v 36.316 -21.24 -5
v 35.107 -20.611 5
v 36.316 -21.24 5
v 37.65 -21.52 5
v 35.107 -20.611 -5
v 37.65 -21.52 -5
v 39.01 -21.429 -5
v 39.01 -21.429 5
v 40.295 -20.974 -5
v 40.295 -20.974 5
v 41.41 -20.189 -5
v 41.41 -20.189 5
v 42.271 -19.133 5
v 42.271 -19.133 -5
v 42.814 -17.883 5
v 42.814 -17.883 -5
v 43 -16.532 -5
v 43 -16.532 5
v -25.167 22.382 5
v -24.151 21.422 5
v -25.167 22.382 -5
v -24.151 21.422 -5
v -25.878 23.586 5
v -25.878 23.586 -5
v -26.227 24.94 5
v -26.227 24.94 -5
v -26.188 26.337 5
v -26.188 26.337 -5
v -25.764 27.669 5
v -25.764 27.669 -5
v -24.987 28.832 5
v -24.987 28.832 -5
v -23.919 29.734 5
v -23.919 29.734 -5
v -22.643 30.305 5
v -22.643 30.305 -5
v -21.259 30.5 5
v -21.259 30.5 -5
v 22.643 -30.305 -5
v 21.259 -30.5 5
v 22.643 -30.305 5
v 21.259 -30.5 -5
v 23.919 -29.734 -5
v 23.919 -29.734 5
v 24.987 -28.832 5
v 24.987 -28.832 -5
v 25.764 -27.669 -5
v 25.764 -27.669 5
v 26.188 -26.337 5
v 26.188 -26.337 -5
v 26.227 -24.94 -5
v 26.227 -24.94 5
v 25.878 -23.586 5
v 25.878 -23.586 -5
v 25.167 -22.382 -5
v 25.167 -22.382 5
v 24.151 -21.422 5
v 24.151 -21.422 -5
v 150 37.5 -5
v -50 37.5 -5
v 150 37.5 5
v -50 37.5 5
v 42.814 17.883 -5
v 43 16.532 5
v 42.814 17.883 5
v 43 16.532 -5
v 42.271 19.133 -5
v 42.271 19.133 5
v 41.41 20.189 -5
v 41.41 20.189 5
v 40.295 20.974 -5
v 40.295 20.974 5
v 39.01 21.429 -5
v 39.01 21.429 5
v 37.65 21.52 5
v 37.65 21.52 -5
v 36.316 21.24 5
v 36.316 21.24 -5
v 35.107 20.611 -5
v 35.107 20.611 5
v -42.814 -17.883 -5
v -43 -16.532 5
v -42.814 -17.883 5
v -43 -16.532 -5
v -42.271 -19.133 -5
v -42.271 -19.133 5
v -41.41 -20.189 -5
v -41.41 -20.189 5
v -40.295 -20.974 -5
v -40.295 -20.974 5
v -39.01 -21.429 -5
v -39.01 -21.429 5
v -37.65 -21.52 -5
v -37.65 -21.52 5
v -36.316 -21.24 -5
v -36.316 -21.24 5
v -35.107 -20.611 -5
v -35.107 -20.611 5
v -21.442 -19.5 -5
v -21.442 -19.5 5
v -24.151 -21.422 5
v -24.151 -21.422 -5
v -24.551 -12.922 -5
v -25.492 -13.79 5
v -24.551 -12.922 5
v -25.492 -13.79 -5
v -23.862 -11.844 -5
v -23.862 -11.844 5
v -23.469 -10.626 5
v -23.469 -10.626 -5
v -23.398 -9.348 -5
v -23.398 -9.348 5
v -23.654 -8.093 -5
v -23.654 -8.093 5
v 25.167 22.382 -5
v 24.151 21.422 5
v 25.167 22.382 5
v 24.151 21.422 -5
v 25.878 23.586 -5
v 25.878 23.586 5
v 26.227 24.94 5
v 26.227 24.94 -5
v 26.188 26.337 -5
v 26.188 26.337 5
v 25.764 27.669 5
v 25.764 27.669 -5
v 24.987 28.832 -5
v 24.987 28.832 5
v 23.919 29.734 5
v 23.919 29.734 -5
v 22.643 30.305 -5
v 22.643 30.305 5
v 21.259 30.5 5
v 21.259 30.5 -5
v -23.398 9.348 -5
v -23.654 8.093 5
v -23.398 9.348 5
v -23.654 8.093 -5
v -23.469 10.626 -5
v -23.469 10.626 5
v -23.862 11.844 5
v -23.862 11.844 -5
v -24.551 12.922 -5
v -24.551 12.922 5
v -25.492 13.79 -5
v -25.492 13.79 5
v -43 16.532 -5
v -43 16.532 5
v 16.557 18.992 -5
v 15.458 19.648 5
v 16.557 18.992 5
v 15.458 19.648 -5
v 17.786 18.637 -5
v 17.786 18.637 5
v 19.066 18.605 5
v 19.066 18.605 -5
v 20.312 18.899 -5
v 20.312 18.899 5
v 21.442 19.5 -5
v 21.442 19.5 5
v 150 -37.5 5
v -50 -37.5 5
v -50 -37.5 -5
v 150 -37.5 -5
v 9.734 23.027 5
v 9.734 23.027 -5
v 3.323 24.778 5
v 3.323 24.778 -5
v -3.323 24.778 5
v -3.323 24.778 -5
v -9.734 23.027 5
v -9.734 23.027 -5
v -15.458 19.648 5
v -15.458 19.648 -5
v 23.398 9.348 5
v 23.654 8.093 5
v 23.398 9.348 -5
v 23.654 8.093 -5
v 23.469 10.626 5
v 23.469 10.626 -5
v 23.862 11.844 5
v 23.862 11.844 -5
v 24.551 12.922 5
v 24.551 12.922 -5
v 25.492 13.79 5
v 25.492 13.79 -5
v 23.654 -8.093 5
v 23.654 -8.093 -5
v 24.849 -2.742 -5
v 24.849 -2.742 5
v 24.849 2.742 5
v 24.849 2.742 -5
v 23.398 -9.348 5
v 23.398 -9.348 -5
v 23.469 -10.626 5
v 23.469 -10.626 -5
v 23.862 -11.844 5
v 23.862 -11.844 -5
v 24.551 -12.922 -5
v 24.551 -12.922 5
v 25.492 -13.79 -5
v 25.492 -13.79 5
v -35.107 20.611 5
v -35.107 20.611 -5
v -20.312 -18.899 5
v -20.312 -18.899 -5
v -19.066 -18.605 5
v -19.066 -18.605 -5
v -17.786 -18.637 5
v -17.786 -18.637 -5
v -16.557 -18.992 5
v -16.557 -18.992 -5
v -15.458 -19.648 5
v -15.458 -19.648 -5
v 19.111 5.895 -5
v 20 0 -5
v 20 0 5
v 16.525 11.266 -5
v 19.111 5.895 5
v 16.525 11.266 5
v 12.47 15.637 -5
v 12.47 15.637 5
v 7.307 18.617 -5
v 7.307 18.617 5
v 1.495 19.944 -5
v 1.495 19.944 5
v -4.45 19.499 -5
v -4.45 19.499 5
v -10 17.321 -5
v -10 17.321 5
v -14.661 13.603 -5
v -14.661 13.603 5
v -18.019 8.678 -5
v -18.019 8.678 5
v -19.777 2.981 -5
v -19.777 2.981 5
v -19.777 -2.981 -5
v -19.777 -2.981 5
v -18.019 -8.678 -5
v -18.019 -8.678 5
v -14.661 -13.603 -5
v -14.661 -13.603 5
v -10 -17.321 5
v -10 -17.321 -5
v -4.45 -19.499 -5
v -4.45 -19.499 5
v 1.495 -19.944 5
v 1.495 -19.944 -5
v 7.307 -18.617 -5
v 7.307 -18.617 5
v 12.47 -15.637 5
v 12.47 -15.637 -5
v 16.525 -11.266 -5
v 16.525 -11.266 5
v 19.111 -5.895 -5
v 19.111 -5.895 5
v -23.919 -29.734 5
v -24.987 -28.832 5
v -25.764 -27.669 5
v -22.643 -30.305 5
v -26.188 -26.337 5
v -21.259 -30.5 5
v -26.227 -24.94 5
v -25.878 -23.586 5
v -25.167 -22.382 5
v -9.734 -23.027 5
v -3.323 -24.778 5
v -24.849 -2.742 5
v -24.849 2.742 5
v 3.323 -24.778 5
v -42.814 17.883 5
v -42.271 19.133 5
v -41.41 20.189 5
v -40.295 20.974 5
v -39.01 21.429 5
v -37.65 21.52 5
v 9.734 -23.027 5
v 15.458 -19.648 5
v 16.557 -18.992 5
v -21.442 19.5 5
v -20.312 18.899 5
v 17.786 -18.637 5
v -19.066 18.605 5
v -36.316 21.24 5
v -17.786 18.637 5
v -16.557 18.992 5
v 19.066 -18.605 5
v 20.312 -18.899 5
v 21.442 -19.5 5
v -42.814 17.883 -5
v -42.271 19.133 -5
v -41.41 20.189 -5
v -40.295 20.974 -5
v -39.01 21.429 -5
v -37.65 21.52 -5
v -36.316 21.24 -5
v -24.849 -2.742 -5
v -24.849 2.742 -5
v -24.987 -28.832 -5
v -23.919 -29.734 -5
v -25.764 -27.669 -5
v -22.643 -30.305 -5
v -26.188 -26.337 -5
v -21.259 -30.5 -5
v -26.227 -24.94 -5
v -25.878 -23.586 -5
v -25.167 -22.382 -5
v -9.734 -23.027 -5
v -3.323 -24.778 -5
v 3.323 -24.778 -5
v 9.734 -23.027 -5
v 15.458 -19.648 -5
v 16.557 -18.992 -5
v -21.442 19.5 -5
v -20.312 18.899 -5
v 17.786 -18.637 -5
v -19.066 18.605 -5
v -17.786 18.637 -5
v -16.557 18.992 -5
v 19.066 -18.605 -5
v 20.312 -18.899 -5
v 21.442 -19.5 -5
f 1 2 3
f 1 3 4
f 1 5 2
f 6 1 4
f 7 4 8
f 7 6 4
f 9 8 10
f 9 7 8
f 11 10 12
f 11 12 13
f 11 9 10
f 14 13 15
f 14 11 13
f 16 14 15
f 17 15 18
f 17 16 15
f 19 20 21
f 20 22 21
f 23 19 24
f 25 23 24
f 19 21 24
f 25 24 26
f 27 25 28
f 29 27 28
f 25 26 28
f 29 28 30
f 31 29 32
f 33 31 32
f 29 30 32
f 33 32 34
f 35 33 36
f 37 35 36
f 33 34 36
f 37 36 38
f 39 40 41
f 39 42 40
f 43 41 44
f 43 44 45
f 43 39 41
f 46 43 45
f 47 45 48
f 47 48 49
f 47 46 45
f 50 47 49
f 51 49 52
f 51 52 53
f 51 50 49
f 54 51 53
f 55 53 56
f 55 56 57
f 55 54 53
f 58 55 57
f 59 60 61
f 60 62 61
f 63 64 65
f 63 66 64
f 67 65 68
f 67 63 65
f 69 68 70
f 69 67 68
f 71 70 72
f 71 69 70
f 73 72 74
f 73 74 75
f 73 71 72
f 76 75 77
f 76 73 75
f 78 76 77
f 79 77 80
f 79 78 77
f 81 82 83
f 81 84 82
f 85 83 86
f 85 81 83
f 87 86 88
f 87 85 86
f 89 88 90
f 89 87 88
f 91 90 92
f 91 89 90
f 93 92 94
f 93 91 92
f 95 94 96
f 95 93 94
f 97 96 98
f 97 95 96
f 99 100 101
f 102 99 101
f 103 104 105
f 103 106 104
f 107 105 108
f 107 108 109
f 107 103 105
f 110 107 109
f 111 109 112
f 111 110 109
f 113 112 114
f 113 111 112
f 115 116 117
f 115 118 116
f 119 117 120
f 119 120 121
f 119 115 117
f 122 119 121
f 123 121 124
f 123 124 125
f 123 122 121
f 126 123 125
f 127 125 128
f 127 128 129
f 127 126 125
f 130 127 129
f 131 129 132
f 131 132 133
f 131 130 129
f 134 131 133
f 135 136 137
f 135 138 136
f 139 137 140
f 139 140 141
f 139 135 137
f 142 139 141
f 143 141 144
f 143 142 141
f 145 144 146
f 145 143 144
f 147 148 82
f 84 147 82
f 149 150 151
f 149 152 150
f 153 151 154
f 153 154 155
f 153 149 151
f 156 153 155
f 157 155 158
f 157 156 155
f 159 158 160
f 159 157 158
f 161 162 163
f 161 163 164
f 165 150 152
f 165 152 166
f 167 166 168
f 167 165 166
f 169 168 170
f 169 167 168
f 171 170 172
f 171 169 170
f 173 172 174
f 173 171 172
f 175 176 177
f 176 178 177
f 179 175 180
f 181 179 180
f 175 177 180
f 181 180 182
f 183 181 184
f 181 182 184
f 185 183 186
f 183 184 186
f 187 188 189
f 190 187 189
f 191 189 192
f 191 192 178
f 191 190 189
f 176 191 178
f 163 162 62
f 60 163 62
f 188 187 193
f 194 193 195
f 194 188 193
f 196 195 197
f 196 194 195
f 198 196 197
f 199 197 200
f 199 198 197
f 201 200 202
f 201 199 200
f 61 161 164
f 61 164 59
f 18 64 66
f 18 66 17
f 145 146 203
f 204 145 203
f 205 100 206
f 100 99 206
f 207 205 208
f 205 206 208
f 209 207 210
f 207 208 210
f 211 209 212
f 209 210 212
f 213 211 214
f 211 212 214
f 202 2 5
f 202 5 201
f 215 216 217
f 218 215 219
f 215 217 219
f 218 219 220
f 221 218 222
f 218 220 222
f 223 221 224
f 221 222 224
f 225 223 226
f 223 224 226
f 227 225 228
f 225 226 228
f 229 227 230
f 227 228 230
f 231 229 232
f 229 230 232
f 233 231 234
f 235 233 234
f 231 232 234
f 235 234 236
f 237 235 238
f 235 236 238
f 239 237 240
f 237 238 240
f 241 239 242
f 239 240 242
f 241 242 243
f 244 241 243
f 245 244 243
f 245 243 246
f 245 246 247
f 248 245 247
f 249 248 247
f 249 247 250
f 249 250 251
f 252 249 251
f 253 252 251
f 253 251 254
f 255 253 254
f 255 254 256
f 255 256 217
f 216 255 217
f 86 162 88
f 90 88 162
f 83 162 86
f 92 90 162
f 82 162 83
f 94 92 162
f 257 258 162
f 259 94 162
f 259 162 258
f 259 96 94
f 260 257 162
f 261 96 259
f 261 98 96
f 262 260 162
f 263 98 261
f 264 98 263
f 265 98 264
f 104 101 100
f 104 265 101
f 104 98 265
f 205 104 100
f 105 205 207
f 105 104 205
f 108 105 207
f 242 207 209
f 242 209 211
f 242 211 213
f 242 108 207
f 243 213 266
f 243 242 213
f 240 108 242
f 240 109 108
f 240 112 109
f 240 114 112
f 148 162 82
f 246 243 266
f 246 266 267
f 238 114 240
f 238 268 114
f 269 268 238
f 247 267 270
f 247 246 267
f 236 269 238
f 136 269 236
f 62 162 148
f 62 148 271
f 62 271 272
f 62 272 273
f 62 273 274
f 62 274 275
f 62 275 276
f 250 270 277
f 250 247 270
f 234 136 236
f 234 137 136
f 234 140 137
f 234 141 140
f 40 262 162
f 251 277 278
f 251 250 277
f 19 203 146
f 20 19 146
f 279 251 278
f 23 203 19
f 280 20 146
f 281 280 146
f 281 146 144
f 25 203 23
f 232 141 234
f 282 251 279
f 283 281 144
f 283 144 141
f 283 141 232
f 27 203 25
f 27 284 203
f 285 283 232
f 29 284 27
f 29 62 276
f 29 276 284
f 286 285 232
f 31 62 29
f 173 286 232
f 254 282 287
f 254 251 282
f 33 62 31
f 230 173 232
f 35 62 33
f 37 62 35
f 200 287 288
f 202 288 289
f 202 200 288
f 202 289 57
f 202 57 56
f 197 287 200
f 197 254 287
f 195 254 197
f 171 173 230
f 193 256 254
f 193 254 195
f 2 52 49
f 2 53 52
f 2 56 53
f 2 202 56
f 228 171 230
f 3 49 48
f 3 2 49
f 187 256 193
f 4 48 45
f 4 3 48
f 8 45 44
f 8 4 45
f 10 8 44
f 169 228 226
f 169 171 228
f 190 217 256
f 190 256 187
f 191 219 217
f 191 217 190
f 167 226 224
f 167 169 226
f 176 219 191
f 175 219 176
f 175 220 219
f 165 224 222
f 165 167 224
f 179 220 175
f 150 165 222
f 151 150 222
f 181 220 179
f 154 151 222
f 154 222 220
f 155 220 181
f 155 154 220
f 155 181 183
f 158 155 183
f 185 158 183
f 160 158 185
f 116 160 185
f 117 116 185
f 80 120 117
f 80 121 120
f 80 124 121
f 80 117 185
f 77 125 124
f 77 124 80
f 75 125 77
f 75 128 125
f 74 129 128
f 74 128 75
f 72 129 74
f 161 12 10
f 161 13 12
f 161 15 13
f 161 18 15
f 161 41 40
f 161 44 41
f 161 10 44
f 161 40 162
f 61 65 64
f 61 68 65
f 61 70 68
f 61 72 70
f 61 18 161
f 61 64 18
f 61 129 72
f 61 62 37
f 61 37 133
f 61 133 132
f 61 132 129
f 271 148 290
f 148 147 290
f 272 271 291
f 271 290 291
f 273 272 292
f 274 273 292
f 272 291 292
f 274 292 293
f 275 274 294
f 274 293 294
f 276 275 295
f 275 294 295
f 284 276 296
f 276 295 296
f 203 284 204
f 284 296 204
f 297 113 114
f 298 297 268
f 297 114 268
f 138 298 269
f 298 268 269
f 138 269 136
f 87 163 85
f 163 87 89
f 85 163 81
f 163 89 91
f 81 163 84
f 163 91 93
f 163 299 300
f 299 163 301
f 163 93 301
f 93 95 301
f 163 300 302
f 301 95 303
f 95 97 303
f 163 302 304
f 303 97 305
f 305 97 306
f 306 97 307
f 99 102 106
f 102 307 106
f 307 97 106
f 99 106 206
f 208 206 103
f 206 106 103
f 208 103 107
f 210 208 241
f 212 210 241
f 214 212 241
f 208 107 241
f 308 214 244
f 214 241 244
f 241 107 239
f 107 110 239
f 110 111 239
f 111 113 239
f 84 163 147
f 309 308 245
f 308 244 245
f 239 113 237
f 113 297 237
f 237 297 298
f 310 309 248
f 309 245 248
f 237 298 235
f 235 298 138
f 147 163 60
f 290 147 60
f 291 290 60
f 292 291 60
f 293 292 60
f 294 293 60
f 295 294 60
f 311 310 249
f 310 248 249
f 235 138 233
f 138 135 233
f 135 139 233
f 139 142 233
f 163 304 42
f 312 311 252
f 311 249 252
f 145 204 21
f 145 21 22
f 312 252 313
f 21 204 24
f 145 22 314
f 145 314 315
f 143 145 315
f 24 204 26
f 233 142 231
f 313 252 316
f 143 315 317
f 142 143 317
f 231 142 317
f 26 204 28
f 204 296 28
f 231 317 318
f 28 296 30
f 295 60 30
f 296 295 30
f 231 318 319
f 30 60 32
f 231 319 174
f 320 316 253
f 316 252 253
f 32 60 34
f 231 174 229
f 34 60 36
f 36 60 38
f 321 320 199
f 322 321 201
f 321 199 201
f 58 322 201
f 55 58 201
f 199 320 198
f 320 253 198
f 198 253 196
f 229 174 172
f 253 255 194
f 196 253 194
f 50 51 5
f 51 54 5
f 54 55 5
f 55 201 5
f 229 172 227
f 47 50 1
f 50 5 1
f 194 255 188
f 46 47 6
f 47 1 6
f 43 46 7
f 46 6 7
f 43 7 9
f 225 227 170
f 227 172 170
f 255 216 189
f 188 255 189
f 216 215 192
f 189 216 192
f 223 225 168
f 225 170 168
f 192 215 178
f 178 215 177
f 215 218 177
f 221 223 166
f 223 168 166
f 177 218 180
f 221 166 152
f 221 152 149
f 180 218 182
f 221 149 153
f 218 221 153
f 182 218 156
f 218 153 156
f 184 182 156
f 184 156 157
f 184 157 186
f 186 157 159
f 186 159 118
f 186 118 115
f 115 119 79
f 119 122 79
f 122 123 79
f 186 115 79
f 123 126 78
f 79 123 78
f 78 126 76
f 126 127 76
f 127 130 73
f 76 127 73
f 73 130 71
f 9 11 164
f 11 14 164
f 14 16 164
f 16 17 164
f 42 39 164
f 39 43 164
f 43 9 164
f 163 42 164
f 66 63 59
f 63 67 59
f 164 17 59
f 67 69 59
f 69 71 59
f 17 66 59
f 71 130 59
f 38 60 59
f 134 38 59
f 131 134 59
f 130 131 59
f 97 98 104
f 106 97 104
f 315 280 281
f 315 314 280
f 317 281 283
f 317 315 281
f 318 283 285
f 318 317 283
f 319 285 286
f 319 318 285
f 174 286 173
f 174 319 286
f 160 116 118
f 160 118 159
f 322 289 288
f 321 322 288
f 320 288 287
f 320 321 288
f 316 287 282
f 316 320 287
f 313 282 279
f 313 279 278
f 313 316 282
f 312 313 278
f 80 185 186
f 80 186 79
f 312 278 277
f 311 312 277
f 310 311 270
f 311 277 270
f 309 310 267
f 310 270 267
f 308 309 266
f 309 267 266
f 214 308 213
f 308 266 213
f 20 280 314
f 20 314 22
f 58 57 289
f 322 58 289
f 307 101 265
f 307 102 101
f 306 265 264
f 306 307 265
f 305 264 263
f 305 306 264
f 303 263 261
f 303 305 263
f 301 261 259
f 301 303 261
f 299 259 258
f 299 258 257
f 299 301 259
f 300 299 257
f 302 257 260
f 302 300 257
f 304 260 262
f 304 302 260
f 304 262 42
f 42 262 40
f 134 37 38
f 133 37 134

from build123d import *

# Parameters (mm, degrees)
SKETCH1_W           = 200
SKETCH1_H           = 75
BOSS_EXTRUDE3_DEPTH = 5
SKETCH2_R           = 20
CUT_EXTRUDE1_DEPTH  = 155.939504323
CUT_EXTRUDE2_DEPTH  = 155.939504323
FILLET1_R           = 5


with BuildPart() as part:
    # Sketch1 → Boss-Extrude3 (new, symmetric)
    with BuildSketch(Plane.XY):
        with Locations((50, 0)):
            Rectangle(SKETCH1_W, SKETCH1_H)
    extrude(amount=BOSS_EXTRUDE3_DEPTH, both=True)

    # Sketch2 → Cut-Extrude1 (cut, through all)
    with BuildSketch(Plane.XY.offset(5)):
        Circle(SKETCH2_R)
    extrude(amount=-CUT_EXTRUDE1_DEPTH, mode=Mode.SUBTRACT)

    # Sketch3 → Cut-Extrude2 (cut, through all)
    with BuildSketch(Plane.XY.offset(5)):
        with BuildLine():
            Line((-43, 26.20895177), (-43, -26.20895177))
            Line((-43, -26.20895177), (-22.215366719, -11.466363047))
            ThreePointArc((-22.215366719, -11.466363047), (-25, 0), (-22.215366719, 11.466363047))
            Line((-22.215366719, 11.466363047), (-43, 26.20895177))
        make_face()
        with BuildLine():
            Line((-36.950325446, 30.5), (36.950325446, 30.5))
            Line((36.950325446, 30.5), (18.165562093, 17.175923668))
            ThreePointArc((18.165562093, 17.175923668), (0, 25), (-18.165562093, 17.175923668))
            Line((-18.165562093, 17.175923668), (-36.950325446, 30.5))
        make_face()
        with BuildLine():
            Line((22.215366719, 11.466363047), (43, 26.20895177))
            Line((43, 26.20895177), (43, -26.20895177))
            Line((43, -26.20895177), (22.215366719, -11.466363047))
            ThreePointArc((22.215366719, -11.466363047), (25, 0), (22.215366719, 11.466363047))
        make_face()
        with BuildLine():
            Line((-18.165562093, -17.175923668), (-36.950325446, -30.5))
            Line((-36.950325446, -30.5), (36.950325446, -30.5))
            Line((36.950325446, -30.5), (18.165562093, -17.175923668))
            ThreePointArc((18.165562093, -17.175923668), (0, -25), (-18.165562093, -17.175923668))
        make_face()
    extrude(amount=-CUT_EXTRUDE2_DEPTH, mode=Mode.SUBTRACT)

    # Fillet1
    fillet1_edges = [part.edges().sort_by_distance(p)[0] for p in [
        (-43, 26.20895177, 0),
        (-22.215366719, 11.466363047, 0),
        (-22.215366719, -11.466363047, 0),
        (-43, -26.20895177, 0),
        (-18.165562093, 17.175923668, 0),
        (-36.950325446, 30.5, 0),
        (36.950325446, 30.5, 0),
        (18.165562093, 17.175923668, 0),
        (22.215366719, -11.466363047, 0),
        (22.215366719, 11.466363047, 0),
        (43, 26.20895177, 0),
        (43, -26.20895177, 0),
        (-18.165562093, -17.175923668, 0),
        (18.165562093, -17.175923668, 0),
        (36.950325446, -30.5, 0),
        (-36.950325446, -30.5, 0),
    ]]
    fillet(fillet1_edges, radius=FILLET1_R)


solid = part.part
